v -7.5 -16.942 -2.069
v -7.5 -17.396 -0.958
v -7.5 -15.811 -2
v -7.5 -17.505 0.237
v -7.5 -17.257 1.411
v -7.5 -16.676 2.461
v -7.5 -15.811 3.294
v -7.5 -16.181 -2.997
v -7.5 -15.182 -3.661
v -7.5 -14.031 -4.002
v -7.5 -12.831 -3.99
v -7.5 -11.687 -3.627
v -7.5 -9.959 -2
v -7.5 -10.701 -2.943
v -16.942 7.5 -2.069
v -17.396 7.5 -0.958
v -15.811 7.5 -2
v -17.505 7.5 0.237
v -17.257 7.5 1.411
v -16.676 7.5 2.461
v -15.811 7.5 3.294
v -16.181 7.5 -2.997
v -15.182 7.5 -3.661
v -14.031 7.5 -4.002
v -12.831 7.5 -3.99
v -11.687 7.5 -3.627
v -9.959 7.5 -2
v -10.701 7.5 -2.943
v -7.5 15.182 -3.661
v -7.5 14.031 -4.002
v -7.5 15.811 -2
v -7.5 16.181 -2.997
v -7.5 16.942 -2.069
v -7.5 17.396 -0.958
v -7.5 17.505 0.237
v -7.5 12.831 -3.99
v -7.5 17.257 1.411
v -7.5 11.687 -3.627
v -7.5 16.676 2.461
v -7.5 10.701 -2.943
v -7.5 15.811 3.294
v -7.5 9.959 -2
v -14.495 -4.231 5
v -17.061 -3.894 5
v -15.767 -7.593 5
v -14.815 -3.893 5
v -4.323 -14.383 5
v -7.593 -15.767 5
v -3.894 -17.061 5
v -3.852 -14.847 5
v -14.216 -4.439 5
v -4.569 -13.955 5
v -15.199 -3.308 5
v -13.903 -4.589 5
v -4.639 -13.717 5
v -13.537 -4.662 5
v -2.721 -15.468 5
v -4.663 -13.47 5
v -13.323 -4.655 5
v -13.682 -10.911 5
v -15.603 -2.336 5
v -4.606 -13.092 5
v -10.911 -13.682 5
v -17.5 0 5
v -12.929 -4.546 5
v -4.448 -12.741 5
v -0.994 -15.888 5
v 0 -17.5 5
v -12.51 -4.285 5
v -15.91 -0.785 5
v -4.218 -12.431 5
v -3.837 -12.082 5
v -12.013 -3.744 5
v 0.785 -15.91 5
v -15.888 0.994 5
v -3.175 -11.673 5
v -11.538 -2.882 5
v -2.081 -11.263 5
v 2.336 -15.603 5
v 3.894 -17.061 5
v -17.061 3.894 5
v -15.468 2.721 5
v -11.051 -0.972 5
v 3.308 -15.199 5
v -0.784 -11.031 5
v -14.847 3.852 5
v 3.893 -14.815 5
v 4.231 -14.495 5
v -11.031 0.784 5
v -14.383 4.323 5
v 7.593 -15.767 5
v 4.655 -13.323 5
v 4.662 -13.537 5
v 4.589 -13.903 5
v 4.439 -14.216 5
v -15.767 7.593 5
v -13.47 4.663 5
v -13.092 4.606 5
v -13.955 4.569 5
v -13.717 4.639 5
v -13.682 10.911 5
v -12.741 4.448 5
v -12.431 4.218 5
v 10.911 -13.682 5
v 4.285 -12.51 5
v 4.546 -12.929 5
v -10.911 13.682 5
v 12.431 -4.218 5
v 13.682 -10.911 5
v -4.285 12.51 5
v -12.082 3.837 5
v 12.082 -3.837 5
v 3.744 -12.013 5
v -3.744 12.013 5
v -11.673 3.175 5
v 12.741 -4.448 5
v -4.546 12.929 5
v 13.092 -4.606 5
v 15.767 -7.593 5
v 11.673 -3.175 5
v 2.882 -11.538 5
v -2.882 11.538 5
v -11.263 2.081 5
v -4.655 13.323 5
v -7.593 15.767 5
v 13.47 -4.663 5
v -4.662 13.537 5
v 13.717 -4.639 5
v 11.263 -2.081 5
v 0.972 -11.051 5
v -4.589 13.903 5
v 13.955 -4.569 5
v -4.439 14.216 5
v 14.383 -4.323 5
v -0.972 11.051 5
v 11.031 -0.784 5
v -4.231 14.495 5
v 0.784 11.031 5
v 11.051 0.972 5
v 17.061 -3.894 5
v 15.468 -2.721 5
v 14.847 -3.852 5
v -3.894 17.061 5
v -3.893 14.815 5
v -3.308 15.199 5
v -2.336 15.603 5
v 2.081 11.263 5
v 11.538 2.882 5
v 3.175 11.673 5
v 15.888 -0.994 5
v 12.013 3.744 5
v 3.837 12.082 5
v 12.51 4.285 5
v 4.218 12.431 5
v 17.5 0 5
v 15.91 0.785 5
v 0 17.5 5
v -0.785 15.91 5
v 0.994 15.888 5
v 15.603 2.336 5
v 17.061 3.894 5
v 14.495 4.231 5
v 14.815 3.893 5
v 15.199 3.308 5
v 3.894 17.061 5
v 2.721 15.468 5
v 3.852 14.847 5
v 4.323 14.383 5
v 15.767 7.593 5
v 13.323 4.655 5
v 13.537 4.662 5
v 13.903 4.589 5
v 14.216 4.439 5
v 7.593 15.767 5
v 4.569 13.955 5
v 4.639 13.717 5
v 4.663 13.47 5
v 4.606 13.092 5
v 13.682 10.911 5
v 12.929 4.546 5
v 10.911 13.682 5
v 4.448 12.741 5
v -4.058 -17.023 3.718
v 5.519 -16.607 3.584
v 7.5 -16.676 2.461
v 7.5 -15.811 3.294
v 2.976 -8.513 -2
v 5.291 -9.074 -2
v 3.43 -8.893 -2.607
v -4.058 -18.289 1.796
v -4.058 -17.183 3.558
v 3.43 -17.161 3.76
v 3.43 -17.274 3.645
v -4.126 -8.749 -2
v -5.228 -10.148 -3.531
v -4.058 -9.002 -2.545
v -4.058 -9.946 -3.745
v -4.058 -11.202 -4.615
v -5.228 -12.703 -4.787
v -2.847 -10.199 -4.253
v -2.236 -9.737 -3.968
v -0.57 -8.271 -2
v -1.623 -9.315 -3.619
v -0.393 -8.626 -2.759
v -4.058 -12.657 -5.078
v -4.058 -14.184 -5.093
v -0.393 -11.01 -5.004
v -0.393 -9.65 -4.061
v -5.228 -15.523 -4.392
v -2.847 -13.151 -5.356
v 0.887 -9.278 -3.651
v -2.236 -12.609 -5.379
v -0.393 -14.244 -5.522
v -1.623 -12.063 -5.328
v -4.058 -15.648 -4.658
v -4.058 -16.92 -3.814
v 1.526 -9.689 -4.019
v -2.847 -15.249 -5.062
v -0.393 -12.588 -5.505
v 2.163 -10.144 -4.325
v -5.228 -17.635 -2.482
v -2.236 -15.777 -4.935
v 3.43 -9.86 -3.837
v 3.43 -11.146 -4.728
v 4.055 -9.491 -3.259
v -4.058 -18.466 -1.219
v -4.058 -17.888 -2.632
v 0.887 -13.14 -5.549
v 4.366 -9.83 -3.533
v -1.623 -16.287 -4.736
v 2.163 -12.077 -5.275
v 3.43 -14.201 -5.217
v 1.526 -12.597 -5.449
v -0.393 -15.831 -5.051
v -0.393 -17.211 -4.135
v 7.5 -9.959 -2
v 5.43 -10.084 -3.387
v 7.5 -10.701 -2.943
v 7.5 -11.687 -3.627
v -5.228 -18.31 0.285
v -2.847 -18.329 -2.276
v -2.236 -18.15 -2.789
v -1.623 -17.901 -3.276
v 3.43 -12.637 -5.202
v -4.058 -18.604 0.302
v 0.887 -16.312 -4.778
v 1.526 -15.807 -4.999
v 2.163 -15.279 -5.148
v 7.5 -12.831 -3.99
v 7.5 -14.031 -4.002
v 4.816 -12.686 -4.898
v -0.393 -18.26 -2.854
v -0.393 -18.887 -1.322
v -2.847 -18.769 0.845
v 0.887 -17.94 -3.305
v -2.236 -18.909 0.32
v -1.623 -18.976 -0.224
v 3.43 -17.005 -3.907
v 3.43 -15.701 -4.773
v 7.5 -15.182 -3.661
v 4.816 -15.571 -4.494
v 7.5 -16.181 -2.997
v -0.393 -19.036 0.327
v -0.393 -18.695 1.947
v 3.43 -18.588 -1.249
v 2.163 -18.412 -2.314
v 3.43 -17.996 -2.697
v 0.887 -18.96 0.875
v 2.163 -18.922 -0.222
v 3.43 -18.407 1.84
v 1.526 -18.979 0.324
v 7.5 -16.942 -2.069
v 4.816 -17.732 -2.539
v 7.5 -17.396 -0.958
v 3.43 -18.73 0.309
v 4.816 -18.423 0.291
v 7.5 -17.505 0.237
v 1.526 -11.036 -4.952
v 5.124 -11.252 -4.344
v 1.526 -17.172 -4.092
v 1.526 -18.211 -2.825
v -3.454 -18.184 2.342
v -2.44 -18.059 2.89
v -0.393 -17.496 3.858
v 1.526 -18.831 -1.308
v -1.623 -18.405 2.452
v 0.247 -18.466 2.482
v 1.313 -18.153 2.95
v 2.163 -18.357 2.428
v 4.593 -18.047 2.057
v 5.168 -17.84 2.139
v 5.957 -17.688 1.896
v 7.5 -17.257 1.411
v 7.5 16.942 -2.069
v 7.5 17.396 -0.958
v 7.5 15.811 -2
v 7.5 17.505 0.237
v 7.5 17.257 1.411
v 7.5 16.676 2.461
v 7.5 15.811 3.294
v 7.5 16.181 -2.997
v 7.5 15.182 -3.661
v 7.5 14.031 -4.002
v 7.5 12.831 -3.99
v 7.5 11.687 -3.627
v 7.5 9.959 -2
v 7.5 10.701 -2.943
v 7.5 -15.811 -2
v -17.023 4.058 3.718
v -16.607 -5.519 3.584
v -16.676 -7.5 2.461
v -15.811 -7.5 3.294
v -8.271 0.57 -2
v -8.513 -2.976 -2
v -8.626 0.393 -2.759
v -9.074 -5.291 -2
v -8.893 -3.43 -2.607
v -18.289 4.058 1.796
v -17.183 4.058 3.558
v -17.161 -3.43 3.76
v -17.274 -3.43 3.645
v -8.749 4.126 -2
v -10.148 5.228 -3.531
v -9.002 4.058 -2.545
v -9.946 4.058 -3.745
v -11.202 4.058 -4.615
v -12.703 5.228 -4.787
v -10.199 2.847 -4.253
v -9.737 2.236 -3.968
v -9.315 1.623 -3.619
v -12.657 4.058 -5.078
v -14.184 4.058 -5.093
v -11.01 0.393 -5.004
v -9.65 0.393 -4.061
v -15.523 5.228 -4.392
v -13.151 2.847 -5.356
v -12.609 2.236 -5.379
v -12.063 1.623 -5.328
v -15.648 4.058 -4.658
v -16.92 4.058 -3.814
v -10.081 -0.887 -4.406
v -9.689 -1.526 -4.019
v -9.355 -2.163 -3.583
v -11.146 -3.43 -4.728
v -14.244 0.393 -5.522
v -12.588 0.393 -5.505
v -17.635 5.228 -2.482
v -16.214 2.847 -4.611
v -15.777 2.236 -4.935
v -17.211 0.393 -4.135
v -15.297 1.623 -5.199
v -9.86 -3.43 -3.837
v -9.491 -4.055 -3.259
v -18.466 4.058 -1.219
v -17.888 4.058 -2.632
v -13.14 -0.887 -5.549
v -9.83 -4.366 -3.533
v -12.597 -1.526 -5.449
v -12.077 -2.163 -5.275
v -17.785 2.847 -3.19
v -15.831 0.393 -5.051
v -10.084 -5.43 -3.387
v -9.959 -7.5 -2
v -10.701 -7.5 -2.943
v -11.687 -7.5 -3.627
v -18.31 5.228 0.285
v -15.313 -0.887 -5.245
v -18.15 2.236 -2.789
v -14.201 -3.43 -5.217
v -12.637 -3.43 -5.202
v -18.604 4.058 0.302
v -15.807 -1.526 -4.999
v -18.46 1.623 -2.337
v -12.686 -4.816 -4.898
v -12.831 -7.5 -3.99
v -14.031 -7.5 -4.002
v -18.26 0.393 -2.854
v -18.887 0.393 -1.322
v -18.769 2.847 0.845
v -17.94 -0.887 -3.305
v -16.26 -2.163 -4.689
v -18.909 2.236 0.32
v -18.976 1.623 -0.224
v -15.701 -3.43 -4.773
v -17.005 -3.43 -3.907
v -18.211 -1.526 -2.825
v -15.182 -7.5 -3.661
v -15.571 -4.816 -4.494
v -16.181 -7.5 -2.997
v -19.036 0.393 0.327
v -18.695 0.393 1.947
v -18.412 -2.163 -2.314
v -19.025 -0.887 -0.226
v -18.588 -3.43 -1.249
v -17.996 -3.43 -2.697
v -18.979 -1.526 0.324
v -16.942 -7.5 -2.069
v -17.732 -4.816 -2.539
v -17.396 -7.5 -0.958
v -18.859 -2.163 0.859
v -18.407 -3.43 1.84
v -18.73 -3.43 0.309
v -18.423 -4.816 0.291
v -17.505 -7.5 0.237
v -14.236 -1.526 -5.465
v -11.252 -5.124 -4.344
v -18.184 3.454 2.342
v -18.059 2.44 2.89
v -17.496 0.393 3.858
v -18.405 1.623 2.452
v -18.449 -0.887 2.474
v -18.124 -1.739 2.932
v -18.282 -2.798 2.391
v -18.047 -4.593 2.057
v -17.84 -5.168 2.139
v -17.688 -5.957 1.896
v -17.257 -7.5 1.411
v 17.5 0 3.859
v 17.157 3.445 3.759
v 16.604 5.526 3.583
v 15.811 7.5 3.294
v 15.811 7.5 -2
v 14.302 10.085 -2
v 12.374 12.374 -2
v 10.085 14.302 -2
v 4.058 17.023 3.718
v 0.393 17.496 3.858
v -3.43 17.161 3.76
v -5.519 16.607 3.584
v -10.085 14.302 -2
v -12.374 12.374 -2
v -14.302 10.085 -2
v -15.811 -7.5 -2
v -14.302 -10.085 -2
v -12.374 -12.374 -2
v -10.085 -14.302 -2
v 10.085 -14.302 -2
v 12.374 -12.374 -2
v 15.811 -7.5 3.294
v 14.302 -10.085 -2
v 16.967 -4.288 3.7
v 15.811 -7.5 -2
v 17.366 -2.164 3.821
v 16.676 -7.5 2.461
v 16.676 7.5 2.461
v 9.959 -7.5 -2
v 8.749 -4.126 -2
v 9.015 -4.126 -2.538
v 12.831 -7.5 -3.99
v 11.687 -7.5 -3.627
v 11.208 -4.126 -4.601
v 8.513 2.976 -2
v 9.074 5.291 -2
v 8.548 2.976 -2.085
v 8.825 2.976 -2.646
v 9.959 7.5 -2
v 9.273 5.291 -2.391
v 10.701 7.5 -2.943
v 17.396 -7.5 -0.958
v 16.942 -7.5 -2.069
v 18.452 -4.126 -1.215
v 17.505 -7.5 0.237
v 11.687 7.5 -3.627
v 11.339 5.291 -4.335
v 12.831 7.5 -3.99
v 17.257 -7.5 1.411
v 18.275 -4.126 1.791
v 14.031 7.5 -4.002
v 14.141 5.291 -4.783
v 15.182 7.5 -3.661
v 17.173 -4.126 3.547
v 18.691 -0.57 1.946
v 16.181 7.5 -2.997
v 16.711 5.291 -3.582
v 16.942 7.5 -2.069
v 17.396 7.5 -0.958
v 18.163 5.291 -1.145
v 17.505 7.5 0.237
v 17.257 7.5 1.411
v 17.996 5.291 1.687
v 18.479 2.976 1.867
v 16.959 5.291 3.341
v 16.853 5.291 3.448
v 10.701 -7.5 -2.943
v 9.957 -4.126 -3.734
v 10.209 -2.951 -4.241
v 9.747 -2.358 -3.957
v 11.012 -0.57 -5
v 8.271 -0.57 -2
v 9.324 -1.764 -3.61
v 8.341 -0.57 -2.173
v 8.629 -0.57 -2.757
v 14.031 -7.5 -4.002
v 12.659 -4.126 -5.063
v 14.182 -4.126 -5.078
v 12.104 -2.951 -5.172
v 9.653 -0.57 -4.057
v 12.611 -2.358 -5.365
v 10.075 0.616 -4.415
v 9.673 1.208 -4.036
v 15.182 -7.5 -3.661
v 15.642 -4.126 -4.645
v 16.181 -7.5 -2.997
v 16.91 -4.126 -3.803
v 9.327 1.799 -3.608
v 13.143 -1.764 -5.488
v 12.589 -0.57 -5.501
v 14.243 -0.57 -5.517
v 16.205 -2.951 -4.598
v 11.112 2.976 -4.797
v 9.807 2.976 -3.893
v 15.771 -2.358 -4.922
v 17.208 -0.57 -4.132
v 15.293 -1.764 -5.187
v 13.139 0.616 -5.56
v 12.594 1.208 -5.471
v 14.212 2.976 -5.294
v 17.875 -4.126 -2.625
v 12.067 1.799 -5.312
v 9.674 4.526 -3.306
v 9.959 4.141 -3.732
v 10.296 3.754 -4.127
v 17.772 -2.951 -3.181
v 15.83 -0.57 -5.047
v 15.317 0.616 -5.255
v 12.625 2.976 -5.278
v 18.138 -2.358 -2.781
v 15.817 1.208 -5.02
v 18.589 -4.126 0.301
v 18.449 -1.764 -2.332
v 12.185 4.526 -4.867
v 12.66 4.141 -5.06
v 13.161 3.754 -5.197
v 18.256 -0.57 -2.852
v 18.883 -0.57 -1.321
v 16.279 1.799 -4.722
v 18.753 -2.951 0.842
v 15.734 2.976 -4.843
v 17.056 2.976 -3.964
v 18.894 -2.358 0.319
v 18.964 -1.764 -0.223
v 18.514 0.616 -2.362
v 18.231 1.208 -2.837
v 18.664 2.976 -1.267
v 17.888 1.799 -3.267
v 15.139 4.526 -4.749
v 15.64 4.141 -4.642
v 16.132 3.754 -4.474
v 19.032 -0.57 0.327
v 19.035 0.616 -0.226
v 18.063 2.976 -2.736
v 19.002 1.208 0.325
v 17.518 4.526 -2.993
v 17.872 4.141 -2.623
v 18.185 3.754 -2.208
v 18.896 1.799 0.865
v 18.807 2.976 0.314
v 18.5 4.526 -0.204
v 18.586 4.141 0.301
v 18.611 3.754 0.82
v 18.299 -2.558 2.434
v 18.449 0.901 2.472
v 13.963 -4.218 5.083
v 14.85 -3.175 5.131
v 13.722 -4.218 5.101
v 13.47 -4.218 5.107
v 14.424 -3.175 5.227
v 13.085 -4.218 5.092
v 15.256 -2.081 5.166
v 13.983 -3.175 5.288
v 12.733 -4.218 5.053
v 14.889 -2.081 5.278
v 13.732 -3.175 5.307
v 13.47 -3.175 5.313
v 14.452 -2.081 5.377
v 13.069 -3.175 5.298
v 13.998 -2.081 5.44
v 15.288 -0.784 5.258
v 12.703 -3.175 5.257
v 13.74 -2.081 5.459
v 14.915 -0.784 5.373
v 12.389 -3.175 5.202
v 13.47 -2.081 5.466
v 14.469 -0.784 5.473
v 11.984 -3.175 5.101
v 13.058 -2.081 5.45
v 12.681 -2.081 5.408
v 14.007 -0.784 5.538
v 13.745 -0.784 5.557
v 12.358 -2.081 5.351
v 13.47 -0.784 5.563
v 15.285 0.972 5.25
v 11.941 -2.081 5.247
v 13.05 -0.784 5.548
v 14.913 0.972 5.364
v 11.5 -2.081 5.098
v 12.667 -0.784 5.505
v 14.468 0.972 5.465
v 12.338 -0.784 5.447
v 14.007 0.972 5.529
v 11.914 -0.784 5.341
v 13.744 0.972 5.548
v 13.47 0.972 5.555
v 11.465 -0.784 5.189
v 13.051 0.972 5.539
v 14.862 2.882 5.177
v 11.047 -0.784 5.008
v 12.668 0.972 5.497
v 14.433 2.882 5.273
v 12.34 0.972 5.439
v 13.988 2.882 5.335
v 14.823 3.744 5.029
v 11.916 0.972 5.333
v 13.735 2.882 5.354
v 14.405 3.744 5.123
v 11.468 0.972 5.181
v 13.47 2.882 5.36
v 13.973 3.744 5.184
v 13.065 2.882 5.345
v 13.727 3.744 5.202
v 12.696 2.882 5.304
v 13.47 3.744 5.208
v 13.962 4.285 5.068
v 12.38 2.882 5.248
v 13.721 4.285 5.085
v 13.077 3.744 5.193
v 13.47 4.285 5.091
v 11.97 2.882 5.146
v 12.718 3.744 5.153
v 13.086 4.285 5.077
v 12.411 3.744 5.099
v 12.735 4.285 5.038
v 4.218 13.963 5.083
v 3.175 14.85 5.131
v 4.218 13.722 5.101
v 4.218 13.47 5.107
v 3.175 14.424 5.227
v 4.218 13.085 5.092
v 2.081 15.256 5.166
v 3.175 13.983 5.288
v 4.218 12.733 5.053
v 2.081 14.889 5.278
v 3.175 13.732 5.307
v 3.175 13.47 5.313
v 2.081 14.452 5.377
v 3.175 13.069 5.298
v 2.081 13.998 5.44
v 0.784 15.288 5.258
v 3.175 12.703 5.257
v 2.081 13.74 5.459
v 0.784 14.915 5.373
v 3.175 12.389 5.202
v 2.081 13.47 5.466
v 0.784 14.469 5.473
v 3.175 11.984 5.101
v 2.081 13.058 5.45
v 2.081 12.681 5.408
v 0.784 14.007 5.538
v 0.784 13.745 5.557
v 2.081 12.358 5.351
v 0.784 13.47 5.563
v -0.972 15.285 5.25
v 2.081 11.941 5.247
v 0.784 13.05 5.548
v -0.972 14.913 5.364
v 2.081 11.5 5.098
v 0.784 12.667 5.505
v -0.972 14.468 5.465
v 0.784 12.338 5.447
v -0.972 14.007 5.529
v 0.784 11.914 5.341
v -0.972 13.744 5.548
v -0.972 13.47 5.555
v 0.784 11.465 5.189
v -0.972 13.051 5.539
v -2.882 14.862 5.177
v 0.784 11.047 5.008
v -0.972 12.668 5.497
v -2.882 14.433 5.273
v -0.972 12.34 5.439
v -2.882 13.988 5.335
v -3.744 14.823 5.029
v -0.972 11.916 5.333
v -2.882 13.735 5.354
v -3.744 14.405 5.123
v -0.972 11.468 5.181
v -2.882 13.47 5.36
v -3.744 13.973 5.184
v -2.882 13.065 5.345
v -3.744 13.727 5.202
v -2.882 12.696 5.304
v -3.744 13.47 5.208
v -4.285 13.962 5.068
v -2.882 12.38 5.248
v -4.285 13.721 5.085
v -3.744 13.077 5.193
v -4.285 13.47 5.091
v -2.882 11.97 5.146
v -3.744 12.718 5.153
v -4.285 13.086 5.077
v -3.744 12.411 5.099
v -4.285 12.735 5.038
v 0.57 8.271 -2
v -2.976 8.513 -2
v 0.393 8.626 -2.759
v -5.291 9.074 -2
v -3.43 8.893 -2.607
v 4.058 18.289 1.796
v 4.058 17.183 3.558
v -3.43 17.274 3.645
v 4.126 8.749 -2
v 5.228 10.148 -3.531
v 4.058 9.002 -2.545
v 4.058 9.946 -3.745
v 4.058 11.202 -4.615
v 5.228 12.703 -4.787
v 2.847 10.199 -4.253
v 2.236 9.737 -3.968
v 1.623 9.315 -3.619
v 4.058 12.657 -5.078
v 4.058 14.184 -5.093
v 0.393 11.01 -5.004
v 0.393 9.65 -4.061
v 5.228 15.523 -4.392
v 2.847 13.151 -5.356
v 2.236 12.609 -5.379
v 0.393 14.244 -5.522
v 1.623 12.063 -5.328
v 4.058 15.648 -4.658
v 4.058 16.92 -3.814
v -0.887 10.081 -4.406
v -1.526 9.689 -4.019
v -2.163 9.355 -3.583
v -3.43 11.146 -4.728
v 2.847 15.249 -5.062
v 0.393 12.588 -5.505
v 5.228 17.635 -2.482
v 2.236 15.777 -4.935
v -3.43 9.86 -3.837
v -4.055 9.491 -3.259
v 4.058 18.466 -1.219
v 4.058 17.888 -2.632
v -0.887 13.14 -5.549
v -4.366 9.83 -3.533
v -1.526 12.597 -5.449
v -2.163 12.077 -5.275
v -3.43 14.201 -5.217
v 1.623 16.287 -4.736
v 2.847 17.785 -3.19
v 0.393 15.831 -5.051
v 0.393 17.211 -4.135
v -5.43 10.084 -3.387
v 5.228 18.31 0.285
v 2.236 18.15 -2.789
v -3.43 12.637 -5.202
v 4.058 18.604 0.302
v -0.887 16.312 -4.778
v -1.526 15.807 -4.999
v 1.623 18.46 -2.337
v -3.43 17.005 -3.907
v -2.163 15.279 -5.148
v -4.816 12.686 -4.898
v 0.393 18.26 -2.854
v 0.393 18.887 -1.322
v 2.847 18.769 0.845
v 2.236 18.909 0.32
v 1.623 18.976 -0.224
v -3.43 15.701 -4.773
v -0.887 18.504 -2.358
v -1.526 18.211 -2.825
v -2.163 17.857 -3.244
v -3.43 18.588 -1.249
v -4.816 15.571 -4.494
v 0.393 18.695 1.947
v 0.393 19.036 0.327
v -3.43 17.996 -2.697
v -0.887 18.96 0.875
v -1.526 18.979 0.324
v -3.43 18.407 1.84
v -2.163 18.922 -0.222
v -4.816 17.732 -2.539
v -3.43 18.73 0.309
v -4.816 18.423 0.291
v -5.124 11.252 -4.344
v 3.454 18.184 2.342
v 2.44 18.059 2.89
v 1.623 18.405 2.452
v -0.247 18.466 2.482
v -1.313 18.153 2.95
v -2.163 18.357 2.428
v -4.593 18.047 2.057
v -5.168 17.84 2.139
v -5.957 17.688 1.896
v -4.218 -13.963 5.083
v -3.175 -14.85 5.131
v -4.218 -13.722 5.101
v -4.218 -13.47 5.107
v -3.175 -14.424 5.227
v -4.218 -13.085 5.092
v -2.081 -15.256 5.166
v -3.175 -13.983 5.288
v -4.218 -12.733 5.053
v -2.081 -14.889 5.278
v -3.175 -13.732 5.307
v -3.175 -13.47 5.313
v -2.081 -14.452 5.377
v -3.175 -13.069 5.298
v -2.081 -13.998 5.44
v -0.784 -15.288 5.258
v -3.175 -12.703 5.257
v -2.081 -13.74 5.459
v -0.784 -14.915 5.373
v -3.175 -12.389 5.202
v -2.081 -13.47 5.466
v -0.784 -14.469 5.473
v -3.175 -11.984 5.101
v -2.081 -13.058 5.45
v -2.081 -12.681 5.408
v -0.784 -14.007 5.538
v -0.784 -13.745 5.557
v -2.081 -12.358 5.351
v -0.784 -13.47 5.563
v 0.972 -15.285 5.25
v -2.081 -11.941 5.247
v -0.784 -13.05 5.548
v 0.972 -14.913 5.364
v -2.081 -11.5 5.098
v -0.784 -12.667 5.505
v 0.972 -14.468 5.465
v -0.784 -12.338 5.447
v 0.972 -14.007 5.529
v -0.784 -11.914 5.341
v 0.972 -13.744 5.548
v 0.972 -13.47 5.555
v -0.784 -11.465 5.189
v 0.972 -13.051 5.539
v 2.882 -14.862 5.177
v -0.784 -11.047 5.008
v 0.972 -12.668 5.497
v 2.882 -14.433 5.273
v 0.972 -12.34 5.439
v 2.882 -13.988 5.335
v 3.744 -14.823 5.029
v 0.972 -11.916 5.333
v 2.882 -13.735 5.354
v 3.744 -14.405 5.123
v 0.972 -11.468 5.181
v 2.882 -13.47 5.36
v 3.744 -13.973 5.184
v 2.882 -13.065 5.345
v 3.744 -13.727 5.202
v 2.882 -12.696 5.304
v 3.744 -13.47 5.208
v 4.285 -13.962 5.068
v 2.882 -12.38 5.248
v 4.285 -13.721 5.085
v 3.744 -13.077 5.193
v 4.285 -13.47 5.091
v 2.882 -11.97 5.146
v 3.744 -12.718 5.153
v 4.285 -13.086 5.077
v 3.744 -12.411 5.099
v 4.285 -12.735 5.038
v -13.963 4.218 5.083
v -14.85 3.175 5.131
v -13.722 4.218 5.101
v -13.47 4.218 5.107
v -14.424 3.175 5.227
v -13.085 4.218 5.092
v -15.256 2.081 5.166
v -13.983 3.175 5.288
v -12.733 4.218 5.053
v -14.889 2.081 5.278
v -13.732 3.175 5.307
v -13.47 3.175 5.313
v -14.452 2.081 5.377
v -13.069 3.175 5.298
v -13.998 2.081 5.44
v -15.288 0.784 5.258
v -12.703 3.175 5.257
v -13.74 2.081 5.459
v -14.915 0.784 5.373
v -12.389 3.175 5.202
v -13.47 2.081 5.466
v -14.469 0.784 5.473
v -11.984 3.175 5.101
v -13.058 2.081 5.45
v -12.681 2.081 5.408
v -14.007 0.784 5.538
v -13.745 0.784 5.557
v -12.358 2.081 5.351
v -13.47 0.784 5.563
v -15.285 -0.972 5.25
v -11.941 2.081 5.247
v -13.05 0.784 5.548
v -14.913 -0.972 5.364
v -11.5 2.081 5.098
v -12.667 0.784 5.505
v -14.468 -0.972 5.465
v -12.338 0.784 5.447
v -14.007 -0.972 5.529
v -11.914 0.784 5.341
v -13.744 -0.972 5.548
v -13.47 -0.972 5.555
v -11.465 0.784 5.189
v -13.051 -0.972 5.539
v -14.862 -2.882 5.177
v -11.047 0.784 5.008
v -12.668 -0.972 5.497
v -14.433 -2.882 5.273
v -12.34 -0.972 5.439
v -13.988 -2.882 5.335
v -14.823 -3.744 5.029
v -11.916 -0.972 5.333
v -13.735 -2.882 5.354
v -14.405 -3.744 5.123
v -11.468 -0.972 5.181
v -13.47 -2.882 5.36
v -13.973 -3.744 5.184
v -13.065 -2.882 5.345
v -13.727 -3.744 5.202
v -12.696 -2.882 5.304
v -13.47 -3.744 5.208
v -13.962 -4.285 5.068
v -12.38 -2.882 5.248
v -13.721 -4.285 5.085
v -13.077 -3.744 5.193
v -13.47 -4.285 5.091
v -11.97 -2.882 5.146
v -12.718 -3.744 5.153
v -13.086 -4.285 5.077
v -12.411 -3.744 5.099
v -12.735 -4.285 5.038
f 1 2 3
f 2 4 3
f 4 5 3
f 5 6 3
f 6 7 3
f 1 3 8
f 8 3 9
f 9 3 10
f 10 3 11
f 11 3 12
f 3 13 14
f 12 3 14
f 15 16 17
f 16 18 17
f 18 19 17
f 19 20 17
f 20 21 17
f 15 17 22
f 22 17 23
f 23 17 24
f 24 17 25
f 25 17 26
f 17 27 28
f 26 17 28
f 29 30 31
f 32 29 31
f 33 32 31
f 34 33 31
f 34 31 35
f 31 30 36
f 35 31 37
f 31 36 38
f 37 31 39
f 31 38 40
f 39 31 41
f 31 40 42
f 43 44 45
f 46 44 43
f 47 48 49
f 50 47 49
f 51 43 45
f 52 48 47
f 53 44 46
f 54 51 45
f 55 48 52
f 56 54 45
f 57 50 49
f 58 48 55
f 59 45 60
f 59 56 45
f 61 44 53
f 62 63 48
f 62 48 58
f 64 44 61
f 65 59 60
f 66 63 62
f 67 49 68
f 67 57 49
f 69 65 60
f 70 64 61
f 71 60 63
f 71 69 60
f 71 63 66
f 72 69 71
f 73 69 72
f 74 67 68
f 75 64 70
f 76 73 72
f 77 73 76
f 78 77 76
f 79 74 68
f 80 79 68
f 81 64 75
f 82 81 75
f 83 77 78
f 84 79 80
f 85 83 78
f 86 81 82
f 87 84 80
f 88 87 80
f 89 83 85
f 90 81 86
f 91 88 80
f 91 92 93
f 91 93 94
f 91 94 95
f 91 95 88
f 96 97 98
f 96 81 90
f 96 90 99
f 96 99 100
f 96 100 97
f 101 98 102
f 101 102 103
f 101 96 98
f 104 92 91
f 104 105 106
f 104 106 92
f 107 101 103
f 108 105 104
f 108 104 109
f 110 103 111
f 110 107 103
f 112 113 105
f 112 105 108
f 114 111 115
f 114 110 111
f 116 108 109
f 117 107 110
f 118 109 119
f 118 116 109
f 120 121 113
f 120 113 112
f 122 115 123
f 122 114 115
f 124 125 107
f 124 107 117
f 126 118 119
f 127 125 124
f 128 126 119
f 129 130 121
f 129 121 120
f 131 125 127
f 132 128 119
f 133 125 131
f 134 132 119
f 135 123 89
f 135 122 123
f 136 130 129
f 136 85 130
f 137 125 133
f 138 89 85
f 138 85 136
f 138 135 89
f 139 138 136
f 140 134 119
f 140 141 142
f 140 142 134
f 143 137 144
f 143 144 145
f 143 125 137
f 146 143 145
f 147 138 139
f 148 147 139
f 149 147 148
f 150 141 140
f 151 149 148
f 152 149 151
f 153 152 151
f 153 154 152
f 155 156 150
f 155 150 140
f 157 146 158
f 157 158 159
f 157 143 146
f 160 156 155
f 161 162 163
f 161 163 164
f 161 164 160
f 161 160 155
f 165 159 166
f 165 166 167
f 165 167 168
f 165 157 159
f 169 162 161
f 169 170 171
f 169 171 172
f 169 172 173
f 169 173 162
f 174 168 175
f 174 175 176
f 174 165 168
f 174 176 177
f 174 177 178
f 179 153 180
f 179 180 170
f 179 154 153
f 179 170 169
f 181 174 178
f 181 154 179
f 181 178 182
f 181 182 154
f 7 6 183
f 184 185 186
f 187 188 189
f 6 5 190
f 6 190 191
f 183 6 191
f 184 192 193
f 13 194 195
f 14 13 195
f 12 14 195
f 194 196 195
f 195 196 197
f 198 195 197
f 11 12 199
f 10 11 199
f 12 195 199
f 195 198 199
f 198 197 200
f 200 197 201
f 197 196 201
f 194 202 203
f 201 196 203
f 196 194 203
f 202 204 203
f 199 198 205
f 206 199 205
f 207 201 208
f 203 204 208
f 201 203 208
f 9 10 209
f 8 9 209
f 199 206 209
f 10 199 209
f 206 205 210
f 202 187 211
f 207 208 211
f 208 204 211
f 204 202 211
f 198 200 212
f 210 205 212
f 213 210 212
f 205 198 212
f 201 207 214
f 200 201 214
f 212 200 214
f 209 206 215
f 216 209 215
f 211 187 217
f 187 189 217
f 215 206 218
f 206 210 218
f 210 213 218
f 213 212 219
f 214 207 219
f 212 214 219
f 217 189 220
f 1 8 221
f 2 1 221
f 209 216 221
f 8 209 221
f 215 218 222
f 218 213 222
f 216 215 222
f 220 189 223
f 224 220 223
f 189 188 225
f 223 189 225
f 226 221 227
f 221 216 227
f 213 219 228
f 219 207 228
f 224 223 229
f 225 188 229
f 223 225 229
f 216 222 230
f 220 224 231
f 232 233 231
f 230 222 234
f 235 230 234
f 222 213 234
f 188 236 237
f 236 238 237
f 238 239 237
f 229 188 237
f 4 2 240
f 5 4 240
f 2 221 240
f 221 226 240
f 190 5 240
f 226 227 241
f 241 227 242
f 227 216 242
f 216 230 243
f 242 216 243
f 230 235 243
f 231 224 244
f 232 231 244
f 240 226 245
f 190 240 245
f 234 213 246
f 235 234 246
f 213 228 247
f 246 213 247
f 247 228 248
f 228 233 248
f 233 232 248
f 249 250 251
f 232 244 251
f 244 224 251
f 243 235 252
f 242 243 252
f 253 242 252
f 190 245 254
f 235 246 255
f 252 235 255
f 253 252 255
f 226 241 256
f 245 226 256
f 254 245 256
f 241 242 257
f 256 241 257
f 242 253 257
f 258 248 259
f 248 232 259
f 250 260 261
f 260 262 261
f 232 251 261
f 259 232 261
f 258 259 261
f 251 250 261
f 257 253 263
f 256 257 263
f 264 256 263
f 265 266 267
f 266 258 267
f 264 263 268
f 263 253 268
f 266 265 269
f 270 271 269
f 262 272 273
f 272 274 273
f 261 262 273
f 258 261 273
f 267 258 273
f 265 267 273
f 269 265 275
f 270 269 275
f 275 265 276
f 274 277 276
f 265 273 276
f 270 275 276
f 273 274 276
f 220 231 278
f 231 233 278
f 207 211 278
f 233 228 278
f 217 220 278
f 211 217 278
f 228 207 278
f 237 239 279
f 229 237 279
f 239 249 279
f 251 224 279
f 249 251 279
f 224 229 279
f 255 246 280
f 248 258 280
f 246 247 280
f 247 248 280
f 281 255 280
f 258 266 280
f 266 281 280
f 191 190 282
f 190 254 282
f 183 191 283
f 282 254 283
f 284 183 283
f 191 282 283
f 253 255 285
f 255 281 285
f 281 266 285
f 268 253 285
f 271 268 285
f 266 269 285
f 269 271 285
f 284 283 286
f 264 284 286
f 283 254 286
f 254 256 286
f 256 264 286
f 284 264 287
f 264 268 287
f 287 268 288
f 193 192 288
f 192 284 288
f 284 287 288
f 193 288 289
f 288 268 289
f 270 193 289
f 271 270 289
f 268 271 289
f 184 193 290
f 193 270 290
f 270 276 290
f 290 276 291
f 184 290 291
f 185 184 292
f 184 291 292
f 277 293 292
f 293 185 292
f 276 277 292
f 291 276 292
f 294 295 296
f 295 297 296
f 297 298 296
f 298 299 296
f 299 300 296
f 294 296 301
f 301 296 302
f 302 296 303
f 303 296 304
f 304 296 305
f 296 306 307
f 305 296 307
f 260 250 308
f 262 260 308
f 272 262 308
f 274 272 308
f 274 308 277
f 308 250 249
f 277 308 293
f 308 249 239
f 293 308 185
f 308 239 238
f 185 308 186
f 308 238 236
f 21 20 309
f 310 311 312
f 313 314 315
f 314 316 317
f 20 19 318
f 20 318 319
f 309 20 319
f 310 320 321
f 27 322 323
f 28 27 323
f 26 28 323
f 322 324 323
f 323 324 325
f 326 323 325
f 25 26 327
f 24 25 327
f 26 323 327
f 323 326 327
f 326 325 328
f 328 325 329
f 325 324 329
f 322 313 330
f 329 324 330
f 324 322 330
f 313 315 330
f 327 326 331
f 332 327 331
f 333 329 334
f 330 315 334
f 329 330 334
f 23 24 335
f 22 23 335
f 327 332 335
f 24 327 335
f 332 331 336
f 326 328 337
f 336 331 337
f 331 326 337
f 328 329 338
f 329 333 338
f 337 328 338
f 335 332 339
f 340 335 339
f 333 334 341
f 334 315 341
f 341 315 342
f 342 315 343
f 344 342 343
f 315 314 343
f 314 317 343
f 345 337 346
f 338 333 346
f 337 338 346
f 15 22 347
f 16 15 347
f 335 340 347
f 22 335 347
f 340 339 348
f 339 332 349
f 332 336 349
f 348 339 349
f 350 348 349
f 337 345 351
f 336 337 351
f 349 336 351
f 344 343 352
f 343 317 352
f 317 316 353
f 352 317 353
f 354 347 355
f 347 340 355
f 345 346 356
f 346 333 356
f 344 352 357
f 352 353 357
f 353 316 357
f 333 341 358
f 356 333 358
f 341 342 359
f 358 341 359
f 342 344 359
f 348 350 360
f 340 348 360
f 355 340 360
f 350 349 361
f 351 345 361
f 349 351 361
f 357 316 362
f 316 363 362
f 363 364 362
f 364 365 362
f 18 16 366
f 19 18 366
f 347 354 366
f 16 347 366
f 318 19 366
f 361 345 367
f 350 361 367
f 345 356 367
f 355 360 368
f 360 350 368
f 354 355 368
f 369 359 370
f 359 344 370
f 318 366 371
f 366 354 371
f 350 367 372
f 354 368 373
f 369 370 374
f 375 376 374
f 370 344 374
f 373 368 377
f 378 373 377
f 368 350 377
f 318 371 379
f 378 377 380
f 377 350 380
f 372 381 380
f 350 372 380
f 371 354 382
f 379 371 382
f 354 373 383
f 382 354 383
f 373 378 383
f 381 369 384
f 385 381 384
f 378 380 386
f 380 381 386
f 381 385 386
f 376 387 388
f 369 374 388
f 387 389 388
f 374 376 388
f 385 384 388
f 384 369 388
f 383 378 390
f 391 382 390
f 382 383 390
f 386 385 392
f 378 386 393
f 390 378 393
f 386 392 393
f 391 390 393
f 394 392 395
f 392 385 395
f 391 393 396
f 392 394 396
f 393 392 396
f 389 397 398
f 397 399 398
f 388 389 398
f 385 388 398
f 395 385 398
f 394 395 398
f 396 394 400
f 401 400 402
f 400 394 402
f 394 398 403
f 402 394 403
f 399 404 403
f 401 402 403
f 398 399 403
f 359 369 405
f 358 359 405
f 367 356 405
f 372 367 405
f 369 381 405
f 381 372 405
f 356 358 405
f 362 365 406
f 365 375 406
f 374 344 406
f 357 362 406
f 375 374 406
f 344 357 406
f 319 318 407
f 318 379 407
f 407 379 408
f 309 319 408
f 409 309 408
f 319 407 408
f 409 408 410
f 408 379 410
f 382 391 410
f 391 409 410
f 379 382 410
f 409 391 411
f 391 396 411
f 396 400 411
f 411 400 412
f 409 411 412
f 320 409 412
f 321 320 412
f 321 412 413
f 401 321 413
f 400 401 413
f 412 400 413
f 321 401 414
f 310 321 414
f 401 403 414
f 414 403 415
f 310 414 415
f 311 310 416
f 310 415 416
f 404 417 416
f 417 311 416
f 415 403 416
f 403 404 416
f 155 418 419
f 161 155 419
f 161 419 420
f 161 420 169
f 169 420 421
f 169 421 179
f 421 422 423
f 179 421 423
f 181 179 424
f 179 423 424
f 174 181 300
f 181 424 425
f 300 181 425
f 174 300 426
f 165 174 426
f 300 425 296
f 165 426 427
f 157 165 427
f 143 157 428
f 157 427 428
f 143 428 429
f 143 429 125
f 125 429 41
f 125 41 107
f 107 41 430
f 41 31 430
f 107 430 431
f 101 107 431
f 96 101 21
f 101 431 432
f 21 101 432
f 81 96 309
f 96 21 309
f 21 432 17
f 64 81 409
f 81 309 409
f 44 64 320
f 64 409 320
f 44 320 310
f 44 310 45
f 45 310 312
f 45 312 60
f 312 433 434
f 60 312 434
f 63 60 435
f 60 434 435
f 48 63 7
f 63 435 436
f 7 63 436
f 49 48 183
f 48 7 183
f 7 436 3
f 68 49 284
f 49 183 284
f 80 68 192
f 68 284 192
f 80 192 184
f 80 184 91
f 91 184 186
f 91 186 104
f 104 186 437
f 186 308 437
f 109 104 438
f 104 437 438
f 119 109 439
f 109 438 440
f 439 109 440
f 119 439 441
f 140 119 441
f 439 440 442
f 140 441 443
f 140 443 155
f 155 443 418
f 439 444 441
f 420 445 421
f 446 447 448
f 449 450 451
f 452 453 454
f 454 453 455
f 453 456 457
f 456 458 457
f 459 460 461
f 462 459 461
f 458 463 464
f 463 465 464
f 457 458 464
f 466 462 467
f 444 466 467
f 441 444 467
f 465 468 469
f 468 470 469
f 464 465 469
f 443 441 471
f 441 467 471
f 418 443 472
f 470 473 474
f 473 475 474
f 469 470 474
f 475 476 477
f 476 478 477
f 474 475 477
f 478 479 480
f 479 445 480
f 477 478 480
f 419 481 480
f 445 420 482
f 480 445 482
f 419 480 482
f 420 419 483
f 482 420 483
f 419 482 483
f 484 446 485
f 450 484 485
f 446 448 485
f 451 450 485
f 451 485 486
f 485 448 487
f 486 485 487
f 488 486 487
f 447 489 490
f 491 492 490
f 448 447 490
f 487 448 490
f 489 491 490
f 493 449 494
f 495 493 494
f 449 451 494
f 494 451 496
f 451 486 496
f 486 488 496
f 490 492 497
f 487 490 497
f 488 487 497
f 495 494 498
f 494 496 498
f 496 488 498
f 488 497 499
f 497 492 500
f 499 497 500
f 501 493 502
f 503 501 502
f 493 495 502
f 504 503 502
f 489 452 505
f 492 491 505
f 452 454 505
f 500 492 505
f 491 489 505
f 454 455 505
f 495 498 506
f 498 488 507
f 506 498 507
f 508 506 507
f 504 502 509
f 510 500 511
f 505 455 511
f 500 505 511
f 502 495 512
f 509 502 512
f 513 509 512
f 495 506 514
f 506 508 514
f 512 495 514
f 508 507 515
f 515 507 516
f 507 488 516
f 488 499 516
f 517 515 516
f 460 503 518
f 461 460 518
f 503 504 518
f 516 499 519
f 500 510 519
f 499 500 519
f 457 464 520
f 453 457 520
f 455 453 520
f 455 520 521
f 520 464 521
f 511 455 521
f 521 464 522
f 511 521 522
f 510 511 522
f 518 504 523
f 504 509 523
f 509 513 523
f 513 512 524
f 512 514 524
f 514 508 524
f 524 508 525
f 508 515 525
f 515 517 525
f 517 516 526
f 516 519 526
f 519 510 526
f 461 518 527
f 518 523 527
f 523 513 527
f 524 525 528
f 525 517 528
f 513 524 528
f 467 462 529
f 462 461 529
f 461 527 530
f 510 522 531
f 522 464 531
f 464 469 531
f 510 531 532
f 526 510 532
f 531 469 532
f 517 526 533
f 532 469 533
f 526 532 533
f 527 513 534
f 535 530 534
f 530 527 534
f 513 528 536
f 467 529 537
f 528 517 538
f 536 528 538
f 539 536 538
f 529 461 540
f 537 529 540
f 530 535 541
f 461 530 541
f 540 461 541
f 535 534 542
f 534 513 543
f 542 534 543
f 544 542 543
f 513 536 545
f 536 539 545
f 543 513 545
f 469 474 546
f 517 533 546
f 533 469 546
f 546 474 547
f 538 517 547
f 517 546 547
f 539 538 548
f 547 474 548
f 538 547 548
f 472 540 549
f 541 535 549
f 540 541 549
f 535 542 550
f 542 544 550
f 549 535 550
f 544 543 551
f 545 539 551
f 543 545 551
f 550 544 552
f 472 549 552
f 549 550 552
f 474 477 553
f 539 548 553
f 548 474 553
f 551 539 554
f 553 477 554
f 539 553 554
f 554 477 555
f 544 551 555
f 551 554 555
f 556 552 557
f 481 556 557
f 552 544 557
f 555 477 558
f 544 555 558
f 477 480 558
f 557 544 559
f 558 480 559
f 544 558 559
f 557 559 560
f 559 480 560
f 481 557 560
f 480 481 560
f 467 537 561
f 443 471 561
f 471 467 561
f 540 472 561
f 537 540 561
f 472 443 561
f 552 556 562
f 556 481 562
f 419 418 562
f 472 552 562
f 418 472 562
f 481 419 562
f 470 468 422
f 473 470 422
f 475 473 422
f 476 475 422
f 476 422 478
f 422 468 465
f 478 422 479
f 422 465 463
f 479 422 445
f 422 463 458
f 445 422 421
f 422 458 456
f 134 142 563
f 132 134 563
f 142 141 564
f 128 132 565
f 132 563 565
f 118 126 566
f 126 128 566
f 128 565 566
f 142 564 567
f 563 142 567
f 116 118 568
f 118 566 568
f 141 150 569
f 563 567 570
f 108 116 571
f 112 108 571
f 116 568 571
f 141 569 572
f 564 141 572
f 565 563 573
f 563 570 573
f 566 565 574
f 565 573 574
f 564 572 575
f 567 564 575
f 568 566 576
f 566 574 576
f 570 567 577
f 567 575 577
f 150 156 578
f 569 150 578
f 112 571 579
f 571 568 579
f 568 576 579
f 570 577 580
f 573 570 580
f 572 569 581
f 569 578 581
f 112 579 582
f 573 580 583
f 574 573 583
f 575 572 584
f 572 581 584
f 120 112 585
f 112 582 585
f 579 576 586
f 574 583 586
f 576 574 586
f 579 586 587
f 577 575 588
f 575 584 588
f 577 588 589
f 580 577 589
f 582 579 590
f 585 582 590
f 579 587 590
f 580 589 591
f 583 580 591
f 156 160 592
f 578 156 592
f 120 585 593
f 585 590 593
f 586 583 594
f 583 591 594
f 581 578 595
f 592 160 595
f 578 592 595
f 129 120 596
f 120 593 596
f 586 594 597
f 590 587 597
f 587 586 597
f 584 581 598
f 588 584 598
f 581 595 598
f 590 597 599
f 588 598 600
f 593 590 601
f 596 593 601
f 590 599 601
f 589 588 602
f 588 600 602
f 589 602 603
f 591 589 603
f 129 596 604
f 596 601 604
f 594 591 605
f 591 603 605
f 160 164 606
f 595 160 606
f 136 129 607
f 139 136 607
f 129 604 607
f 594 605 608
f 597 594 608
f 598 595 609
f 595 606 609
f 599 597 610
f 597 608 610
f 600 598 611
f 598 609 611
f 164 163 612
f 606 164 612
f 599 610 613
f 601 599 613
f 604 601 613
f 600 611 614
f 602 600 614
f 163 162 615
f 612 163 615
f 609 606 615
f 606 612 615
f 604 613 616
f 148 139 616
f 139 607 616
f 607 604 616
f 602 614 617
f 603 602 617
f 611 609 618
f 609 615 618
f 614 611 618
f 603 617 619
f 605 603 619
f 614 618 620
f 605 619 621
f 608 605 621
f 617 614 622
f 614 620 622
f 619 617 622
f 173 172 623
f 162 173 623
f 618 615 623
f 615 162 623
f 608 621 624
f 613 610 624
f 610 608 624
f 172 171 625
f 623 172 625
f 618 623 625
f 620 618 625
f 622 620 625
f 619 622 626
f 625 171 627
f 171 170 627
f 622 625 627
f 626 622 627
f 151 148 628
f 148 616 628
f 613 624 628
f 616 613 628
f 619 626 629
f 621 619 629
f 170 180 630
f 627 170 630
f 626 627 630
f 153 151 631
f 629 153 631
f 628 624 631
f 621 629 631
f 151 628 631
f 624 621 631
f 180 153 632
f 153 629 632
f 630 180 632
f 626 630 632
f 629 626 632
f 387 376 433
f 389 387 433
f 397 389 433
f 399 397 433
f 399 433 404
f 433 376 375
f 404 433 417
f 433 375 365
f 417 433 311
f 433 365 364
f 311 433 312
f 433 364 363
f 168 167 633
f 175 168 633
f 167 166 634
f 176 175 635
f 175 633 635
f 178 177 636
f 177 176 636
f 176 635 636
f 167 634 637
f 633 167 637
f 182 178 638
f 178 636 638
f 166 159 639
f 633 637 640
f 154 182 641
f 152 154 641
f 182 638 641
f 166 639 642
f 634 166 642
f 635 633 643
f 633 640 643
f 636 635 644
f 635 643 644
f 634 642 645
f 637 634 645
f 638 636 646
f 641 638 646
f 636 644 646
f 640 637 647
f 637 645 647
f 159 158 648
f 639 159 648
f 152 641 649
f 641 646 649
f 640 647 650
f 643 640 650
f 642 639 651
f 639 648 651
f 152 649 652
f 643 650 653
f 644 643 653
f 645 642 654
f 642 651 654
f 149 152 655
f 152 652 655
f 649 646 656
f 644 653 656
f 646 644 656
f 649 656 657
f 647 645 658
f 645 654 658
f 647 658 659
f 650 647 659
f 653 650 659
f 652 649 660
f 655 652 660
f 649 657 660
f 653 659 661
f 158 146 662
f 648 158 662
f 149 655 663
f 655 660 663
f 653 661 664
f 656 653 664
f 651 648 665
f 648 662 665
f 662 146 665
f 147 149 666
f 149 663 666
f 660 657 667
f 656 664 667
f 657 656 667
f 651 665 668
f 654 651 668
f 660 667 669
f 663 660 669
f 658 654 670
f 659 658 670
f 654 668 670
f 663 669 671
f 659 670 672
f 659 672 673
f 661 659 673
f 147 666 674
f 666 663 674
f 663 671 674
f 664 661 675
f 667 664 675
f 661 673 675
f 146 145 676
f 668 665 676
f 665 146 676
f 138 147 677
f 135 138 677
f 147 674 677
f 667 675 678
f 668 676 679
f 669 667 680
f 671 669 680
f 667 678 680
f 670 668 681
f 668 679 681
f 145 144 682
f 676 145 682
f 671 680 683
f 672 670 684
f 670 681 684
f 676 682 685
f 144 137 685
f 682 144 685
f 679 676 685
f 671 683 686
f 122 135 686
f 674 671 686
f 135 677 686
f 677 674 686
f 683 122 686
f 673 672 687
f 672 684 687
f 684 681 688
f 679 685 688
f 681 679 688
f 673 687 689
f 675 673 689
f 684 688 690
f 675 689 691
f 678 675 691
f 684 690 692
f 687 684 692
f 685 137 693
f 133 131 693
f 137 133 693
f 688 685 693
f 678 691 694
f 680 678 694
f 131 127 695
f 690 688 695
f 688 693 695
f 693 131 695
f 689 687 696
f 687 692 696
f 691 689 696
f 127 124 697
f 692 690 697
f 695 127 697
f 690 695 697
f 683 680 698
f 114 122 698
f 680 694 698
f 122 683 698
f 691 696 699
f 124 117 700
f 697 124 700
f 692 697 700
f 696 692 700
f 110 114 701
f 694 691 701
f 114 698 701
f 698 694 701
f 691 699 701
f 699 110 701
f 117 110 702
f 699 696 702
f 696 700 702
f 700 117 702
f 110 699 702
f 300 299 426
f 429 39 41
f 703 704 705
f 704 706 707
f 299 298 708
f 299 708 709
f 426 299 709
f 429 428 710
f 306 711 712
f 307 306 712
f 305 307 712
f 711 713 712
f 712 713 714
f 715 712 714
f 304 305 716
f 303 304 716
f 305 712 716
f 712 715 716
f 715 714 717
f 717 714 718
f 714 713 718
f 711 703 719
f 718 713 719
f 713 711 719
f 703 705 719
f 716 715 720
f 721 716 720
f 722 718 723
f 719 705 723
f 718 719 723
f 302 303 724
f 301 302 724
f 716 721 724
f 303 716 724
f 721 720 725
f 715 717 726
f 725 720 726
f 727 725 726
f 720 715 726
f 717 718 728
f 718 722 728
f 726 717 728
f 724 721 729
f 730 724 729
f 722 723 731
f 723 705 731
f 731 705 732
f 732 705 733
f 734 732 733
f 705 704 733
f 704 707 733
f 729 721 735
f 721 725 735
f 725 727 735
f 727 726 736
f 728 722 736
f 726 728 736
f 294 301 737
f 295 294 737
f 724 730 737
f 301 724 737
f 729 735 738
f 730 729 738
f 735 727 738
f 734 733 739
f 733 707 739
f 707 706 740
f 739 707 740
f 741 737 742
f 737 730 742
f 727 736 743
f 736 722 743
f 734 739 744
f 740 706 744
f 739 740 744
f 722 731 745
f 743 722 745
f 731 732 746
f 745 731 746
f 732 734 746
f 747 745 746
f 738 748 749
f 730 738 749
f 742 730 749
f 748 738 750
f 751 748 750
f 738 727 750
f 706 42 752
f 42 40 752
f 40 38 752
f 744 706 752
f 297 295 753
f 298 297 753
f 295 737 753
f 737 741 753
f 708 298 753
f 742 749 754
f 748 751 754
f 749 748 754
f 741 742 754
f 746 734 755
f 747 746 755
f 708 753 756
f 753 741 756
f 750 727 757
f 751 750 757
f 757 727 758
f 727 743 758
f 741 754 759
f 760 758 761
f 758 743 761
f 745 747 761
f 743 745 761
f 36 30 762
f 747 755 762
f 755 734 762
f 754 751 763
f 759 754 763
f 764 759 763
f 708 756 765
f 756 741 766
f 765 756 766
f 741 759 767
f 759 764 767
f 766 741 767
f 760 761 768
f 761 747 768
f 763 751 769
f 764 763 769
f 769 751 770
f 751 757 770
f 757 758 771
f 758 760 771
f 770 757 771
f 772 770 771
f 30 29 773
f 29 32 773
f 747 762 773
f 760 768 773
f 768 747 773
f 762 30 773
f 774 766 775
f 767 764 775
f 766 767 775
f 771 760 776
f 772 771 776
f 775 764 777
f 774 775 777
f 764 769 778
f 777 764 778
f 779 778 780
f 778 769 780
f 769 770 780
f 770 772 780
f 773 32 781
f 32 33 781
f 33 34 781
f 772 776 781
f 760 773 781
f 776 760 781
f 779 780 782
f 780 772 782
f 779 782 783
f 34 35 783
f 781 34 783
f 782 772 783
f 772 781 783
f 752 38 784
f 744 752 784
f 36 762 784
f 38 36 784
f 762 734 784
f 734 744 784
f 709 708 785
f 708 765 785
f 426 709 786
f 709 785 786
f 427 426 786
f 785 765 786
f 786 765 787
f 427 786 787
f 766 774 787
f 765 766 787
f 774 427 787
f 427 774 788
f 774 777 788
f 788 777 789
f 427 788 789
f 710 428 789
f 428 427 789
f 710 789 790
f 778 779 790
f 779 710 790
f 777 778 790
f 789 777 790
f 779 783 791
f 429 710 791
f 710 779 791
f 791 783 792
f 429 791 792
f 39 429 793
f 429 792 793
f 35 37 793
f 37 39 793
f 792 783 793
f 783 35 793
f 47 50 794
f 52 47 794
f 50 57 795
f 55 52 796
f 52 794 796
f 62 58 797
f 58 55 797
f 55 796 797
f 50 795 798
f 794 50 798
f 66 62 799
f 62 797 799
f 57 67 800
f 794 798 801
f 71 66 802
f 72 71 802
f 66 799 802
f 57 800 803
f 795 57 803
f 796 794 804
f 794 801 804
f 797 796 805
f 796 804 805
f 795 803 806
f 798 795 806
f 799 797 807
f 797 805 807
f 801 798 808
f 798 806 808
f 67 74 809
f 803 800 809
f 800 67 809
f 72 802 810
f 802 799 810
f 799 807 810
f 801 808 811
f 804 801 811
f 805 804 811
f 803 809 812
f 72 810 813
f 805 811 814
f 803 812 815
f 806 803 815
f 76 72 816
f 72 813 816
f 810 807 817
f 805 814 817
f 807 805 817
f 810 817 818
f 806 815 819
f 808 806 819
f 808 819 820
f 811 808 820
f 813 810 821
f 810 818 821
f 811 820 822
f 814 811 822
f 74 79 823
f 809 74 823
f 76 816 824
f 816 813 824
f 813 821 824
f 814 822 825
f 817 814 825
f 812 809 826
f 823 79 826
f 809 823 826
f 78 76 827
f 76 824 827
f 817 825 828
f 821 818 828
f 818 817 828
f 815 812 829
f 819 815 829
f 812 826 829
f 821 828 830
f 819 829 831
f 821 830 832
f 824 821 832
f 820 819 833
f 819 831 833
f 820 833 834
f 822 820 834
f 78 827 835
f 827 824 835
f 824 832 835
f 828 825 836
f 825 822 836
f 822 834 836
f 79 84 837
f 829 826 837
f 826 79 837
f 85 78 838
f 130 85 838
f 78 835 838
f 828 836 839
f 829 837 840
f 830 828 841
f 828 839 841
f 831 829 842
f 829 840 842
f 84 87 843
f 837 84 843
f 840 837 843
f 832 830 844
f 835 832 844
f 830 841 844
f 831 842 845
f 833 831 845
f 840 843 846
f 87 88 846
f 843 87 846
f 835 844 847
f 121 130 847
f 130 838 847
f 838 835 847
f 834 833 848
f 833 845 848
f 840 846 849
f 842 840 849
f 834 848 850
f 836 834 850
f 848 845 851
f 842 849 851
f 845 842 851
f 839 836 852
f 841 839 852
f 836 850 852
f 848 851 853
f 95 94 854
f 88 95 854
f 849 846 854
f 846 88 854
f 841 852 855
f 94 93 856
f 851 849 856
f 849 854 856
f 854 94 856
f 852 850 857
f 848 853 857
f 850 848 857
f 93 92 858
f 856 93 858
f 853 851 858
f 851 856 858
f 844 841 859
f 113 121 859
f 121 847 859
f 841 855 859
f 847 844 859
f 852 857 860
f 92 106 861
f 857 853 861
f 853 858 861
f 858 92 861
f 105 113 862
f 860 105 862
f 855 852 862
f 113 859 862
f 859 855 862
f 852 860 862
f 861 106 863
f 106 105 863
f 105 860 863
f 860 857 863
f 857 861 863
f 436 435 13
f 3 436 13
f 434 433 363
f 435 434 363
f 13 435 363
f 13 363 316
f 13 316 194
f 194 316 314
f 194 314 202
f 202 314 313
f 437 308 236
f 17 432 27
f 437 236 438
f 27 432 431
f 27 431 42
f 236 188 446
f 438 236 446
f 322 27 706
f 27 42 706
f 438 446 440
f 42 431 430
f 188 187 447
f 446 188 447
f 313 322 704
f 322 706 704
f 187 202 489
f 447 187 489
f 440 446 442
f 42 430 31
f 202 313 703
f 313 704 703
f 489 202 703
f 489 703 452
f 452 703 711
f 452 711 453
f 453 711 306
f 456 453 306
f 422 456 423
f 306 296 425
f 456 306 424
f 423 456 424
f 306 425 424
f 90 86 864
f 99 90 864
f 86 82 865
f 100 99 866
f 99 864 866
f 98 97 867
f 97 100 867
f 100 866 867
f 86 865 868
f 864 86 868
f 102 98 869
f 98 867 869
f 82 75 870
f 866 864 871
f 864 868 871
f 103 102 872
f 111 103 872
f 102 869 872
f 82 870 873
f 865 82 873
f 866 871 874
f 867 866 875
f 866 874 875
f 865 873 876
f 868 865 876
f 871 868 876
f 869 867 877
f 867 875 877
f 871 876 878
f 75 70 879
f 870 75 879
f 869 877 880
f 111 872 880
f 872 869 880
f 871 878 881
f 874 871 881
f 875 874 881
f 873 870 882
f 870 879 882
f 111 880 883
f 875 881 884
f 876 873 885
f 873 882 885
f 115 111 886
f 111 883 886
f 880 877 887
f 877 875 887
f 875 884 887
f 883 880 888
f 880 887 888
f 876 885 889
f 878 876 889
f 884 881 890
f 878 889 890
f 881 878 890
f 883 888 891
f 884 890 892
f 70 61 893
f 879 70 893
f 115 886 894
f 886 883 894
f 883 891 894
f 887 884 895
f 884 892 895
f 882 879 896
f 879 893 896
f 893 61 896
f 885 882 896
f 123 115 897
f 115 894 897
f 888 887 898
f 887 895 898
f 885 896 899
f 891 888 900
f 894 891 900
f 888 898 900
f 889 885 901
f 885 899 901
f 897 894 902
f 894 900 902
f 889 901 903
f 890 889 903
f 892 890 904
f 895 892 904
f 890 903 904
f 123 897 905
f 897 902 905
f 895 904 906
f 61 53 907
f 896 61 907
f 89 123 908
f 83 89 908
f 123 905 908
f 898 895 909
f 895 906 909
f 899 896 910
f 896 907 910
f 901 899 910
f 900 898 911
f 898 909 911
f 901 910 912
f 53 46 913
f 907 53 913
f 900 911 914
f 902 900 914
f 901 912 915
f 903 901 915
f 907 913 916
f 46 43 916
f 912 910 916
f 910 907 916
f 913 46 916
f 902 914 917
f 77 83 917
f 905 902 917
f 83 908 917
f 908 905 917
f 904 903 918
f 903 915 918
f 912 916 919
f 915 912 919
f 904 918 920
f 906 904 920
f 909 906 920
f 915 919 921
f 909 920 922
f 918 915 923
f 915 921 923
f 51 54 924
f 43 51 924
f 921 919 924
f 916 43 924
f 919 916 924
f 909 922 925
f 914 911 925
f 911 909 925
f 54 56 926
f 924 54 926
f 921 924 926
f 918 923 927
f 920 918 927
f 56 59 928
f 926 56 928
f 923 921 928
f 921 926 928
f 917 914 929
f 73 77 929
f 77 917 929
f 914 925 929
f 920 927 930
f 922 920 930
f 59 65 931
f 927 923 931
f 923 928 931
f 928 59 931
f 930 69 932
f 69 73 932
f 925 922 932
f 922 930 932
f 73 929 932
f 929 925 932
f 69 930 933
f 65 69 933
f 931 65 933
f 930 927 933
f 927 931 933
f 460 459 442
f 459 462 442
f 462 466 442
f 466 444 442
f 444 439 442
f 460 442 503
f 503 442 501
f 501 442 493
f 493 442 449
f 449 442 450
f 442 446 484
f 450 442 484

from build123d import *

# Parameters (mm, degrees)
EXTRUDE_1_DEPTH          = 5
EXTRUDE_1_DEPTH_BACK     = 2
SKETCH_2_R               = 17.5
PATTERN_CIRCULAR_1_COUNT = 4


with BuildPart() as part:
    # ｽｹｯﾁ1 → 回転1 (revolve)
    with BuildSketch(Plane.XY, mode=Mode.PRIVATE) as revolve_1_sk:
        with BuildLine():
            Line((-7.5, 17.511496224), (-7.5, 13.470384182))
            Line((-7.5, 13.470384182), (7.5, 13.470384182))
            Line((7.5, 13.470384182), (7.5, 17.511496224))
            ThreePointArc((7.5, 17.511496224), (0, 19.05), (-7.5, 17.511496224))
        make_face()
    revolve_1 = revolve(revolve_1_sk.sketch.rotate(Axis((-13.470384182, 13.470384182, 0), (1, 0, 0)), 90), axis=Axis((-13.470384182, 13.470384182, 0), (1, 0, 0)))

    # ｽｹｯﾁ2 → ﾎﾞｽ - 押し出し1 (add, two sides: drawn at the far end of the back side and taken through both)
    with BuildSketch(Plane.XY.offset(-EXTRUDE_1_DEPTH_BACK)):
        Circle(SKETCH_2_R)
    extrude(amount=EXTRUDE_1_DEPTH + EXTRUDE_1_DEPTH_BACK)

    # 円形ﾊﾟﾀｰﾝ1: 回転1 ×4 about axis
    pattern_circular_1_axis = Axis((0, 0, 0), (0, 0, 1))
    for i in range(1, PATTERN_CIRCULAR_1_COUNT):
        add(revolve_1.rotate(pattern_circular_1_axis, i * 360 / PATTERN_CIRCULAR_1_COUNT))


solid = part.part
